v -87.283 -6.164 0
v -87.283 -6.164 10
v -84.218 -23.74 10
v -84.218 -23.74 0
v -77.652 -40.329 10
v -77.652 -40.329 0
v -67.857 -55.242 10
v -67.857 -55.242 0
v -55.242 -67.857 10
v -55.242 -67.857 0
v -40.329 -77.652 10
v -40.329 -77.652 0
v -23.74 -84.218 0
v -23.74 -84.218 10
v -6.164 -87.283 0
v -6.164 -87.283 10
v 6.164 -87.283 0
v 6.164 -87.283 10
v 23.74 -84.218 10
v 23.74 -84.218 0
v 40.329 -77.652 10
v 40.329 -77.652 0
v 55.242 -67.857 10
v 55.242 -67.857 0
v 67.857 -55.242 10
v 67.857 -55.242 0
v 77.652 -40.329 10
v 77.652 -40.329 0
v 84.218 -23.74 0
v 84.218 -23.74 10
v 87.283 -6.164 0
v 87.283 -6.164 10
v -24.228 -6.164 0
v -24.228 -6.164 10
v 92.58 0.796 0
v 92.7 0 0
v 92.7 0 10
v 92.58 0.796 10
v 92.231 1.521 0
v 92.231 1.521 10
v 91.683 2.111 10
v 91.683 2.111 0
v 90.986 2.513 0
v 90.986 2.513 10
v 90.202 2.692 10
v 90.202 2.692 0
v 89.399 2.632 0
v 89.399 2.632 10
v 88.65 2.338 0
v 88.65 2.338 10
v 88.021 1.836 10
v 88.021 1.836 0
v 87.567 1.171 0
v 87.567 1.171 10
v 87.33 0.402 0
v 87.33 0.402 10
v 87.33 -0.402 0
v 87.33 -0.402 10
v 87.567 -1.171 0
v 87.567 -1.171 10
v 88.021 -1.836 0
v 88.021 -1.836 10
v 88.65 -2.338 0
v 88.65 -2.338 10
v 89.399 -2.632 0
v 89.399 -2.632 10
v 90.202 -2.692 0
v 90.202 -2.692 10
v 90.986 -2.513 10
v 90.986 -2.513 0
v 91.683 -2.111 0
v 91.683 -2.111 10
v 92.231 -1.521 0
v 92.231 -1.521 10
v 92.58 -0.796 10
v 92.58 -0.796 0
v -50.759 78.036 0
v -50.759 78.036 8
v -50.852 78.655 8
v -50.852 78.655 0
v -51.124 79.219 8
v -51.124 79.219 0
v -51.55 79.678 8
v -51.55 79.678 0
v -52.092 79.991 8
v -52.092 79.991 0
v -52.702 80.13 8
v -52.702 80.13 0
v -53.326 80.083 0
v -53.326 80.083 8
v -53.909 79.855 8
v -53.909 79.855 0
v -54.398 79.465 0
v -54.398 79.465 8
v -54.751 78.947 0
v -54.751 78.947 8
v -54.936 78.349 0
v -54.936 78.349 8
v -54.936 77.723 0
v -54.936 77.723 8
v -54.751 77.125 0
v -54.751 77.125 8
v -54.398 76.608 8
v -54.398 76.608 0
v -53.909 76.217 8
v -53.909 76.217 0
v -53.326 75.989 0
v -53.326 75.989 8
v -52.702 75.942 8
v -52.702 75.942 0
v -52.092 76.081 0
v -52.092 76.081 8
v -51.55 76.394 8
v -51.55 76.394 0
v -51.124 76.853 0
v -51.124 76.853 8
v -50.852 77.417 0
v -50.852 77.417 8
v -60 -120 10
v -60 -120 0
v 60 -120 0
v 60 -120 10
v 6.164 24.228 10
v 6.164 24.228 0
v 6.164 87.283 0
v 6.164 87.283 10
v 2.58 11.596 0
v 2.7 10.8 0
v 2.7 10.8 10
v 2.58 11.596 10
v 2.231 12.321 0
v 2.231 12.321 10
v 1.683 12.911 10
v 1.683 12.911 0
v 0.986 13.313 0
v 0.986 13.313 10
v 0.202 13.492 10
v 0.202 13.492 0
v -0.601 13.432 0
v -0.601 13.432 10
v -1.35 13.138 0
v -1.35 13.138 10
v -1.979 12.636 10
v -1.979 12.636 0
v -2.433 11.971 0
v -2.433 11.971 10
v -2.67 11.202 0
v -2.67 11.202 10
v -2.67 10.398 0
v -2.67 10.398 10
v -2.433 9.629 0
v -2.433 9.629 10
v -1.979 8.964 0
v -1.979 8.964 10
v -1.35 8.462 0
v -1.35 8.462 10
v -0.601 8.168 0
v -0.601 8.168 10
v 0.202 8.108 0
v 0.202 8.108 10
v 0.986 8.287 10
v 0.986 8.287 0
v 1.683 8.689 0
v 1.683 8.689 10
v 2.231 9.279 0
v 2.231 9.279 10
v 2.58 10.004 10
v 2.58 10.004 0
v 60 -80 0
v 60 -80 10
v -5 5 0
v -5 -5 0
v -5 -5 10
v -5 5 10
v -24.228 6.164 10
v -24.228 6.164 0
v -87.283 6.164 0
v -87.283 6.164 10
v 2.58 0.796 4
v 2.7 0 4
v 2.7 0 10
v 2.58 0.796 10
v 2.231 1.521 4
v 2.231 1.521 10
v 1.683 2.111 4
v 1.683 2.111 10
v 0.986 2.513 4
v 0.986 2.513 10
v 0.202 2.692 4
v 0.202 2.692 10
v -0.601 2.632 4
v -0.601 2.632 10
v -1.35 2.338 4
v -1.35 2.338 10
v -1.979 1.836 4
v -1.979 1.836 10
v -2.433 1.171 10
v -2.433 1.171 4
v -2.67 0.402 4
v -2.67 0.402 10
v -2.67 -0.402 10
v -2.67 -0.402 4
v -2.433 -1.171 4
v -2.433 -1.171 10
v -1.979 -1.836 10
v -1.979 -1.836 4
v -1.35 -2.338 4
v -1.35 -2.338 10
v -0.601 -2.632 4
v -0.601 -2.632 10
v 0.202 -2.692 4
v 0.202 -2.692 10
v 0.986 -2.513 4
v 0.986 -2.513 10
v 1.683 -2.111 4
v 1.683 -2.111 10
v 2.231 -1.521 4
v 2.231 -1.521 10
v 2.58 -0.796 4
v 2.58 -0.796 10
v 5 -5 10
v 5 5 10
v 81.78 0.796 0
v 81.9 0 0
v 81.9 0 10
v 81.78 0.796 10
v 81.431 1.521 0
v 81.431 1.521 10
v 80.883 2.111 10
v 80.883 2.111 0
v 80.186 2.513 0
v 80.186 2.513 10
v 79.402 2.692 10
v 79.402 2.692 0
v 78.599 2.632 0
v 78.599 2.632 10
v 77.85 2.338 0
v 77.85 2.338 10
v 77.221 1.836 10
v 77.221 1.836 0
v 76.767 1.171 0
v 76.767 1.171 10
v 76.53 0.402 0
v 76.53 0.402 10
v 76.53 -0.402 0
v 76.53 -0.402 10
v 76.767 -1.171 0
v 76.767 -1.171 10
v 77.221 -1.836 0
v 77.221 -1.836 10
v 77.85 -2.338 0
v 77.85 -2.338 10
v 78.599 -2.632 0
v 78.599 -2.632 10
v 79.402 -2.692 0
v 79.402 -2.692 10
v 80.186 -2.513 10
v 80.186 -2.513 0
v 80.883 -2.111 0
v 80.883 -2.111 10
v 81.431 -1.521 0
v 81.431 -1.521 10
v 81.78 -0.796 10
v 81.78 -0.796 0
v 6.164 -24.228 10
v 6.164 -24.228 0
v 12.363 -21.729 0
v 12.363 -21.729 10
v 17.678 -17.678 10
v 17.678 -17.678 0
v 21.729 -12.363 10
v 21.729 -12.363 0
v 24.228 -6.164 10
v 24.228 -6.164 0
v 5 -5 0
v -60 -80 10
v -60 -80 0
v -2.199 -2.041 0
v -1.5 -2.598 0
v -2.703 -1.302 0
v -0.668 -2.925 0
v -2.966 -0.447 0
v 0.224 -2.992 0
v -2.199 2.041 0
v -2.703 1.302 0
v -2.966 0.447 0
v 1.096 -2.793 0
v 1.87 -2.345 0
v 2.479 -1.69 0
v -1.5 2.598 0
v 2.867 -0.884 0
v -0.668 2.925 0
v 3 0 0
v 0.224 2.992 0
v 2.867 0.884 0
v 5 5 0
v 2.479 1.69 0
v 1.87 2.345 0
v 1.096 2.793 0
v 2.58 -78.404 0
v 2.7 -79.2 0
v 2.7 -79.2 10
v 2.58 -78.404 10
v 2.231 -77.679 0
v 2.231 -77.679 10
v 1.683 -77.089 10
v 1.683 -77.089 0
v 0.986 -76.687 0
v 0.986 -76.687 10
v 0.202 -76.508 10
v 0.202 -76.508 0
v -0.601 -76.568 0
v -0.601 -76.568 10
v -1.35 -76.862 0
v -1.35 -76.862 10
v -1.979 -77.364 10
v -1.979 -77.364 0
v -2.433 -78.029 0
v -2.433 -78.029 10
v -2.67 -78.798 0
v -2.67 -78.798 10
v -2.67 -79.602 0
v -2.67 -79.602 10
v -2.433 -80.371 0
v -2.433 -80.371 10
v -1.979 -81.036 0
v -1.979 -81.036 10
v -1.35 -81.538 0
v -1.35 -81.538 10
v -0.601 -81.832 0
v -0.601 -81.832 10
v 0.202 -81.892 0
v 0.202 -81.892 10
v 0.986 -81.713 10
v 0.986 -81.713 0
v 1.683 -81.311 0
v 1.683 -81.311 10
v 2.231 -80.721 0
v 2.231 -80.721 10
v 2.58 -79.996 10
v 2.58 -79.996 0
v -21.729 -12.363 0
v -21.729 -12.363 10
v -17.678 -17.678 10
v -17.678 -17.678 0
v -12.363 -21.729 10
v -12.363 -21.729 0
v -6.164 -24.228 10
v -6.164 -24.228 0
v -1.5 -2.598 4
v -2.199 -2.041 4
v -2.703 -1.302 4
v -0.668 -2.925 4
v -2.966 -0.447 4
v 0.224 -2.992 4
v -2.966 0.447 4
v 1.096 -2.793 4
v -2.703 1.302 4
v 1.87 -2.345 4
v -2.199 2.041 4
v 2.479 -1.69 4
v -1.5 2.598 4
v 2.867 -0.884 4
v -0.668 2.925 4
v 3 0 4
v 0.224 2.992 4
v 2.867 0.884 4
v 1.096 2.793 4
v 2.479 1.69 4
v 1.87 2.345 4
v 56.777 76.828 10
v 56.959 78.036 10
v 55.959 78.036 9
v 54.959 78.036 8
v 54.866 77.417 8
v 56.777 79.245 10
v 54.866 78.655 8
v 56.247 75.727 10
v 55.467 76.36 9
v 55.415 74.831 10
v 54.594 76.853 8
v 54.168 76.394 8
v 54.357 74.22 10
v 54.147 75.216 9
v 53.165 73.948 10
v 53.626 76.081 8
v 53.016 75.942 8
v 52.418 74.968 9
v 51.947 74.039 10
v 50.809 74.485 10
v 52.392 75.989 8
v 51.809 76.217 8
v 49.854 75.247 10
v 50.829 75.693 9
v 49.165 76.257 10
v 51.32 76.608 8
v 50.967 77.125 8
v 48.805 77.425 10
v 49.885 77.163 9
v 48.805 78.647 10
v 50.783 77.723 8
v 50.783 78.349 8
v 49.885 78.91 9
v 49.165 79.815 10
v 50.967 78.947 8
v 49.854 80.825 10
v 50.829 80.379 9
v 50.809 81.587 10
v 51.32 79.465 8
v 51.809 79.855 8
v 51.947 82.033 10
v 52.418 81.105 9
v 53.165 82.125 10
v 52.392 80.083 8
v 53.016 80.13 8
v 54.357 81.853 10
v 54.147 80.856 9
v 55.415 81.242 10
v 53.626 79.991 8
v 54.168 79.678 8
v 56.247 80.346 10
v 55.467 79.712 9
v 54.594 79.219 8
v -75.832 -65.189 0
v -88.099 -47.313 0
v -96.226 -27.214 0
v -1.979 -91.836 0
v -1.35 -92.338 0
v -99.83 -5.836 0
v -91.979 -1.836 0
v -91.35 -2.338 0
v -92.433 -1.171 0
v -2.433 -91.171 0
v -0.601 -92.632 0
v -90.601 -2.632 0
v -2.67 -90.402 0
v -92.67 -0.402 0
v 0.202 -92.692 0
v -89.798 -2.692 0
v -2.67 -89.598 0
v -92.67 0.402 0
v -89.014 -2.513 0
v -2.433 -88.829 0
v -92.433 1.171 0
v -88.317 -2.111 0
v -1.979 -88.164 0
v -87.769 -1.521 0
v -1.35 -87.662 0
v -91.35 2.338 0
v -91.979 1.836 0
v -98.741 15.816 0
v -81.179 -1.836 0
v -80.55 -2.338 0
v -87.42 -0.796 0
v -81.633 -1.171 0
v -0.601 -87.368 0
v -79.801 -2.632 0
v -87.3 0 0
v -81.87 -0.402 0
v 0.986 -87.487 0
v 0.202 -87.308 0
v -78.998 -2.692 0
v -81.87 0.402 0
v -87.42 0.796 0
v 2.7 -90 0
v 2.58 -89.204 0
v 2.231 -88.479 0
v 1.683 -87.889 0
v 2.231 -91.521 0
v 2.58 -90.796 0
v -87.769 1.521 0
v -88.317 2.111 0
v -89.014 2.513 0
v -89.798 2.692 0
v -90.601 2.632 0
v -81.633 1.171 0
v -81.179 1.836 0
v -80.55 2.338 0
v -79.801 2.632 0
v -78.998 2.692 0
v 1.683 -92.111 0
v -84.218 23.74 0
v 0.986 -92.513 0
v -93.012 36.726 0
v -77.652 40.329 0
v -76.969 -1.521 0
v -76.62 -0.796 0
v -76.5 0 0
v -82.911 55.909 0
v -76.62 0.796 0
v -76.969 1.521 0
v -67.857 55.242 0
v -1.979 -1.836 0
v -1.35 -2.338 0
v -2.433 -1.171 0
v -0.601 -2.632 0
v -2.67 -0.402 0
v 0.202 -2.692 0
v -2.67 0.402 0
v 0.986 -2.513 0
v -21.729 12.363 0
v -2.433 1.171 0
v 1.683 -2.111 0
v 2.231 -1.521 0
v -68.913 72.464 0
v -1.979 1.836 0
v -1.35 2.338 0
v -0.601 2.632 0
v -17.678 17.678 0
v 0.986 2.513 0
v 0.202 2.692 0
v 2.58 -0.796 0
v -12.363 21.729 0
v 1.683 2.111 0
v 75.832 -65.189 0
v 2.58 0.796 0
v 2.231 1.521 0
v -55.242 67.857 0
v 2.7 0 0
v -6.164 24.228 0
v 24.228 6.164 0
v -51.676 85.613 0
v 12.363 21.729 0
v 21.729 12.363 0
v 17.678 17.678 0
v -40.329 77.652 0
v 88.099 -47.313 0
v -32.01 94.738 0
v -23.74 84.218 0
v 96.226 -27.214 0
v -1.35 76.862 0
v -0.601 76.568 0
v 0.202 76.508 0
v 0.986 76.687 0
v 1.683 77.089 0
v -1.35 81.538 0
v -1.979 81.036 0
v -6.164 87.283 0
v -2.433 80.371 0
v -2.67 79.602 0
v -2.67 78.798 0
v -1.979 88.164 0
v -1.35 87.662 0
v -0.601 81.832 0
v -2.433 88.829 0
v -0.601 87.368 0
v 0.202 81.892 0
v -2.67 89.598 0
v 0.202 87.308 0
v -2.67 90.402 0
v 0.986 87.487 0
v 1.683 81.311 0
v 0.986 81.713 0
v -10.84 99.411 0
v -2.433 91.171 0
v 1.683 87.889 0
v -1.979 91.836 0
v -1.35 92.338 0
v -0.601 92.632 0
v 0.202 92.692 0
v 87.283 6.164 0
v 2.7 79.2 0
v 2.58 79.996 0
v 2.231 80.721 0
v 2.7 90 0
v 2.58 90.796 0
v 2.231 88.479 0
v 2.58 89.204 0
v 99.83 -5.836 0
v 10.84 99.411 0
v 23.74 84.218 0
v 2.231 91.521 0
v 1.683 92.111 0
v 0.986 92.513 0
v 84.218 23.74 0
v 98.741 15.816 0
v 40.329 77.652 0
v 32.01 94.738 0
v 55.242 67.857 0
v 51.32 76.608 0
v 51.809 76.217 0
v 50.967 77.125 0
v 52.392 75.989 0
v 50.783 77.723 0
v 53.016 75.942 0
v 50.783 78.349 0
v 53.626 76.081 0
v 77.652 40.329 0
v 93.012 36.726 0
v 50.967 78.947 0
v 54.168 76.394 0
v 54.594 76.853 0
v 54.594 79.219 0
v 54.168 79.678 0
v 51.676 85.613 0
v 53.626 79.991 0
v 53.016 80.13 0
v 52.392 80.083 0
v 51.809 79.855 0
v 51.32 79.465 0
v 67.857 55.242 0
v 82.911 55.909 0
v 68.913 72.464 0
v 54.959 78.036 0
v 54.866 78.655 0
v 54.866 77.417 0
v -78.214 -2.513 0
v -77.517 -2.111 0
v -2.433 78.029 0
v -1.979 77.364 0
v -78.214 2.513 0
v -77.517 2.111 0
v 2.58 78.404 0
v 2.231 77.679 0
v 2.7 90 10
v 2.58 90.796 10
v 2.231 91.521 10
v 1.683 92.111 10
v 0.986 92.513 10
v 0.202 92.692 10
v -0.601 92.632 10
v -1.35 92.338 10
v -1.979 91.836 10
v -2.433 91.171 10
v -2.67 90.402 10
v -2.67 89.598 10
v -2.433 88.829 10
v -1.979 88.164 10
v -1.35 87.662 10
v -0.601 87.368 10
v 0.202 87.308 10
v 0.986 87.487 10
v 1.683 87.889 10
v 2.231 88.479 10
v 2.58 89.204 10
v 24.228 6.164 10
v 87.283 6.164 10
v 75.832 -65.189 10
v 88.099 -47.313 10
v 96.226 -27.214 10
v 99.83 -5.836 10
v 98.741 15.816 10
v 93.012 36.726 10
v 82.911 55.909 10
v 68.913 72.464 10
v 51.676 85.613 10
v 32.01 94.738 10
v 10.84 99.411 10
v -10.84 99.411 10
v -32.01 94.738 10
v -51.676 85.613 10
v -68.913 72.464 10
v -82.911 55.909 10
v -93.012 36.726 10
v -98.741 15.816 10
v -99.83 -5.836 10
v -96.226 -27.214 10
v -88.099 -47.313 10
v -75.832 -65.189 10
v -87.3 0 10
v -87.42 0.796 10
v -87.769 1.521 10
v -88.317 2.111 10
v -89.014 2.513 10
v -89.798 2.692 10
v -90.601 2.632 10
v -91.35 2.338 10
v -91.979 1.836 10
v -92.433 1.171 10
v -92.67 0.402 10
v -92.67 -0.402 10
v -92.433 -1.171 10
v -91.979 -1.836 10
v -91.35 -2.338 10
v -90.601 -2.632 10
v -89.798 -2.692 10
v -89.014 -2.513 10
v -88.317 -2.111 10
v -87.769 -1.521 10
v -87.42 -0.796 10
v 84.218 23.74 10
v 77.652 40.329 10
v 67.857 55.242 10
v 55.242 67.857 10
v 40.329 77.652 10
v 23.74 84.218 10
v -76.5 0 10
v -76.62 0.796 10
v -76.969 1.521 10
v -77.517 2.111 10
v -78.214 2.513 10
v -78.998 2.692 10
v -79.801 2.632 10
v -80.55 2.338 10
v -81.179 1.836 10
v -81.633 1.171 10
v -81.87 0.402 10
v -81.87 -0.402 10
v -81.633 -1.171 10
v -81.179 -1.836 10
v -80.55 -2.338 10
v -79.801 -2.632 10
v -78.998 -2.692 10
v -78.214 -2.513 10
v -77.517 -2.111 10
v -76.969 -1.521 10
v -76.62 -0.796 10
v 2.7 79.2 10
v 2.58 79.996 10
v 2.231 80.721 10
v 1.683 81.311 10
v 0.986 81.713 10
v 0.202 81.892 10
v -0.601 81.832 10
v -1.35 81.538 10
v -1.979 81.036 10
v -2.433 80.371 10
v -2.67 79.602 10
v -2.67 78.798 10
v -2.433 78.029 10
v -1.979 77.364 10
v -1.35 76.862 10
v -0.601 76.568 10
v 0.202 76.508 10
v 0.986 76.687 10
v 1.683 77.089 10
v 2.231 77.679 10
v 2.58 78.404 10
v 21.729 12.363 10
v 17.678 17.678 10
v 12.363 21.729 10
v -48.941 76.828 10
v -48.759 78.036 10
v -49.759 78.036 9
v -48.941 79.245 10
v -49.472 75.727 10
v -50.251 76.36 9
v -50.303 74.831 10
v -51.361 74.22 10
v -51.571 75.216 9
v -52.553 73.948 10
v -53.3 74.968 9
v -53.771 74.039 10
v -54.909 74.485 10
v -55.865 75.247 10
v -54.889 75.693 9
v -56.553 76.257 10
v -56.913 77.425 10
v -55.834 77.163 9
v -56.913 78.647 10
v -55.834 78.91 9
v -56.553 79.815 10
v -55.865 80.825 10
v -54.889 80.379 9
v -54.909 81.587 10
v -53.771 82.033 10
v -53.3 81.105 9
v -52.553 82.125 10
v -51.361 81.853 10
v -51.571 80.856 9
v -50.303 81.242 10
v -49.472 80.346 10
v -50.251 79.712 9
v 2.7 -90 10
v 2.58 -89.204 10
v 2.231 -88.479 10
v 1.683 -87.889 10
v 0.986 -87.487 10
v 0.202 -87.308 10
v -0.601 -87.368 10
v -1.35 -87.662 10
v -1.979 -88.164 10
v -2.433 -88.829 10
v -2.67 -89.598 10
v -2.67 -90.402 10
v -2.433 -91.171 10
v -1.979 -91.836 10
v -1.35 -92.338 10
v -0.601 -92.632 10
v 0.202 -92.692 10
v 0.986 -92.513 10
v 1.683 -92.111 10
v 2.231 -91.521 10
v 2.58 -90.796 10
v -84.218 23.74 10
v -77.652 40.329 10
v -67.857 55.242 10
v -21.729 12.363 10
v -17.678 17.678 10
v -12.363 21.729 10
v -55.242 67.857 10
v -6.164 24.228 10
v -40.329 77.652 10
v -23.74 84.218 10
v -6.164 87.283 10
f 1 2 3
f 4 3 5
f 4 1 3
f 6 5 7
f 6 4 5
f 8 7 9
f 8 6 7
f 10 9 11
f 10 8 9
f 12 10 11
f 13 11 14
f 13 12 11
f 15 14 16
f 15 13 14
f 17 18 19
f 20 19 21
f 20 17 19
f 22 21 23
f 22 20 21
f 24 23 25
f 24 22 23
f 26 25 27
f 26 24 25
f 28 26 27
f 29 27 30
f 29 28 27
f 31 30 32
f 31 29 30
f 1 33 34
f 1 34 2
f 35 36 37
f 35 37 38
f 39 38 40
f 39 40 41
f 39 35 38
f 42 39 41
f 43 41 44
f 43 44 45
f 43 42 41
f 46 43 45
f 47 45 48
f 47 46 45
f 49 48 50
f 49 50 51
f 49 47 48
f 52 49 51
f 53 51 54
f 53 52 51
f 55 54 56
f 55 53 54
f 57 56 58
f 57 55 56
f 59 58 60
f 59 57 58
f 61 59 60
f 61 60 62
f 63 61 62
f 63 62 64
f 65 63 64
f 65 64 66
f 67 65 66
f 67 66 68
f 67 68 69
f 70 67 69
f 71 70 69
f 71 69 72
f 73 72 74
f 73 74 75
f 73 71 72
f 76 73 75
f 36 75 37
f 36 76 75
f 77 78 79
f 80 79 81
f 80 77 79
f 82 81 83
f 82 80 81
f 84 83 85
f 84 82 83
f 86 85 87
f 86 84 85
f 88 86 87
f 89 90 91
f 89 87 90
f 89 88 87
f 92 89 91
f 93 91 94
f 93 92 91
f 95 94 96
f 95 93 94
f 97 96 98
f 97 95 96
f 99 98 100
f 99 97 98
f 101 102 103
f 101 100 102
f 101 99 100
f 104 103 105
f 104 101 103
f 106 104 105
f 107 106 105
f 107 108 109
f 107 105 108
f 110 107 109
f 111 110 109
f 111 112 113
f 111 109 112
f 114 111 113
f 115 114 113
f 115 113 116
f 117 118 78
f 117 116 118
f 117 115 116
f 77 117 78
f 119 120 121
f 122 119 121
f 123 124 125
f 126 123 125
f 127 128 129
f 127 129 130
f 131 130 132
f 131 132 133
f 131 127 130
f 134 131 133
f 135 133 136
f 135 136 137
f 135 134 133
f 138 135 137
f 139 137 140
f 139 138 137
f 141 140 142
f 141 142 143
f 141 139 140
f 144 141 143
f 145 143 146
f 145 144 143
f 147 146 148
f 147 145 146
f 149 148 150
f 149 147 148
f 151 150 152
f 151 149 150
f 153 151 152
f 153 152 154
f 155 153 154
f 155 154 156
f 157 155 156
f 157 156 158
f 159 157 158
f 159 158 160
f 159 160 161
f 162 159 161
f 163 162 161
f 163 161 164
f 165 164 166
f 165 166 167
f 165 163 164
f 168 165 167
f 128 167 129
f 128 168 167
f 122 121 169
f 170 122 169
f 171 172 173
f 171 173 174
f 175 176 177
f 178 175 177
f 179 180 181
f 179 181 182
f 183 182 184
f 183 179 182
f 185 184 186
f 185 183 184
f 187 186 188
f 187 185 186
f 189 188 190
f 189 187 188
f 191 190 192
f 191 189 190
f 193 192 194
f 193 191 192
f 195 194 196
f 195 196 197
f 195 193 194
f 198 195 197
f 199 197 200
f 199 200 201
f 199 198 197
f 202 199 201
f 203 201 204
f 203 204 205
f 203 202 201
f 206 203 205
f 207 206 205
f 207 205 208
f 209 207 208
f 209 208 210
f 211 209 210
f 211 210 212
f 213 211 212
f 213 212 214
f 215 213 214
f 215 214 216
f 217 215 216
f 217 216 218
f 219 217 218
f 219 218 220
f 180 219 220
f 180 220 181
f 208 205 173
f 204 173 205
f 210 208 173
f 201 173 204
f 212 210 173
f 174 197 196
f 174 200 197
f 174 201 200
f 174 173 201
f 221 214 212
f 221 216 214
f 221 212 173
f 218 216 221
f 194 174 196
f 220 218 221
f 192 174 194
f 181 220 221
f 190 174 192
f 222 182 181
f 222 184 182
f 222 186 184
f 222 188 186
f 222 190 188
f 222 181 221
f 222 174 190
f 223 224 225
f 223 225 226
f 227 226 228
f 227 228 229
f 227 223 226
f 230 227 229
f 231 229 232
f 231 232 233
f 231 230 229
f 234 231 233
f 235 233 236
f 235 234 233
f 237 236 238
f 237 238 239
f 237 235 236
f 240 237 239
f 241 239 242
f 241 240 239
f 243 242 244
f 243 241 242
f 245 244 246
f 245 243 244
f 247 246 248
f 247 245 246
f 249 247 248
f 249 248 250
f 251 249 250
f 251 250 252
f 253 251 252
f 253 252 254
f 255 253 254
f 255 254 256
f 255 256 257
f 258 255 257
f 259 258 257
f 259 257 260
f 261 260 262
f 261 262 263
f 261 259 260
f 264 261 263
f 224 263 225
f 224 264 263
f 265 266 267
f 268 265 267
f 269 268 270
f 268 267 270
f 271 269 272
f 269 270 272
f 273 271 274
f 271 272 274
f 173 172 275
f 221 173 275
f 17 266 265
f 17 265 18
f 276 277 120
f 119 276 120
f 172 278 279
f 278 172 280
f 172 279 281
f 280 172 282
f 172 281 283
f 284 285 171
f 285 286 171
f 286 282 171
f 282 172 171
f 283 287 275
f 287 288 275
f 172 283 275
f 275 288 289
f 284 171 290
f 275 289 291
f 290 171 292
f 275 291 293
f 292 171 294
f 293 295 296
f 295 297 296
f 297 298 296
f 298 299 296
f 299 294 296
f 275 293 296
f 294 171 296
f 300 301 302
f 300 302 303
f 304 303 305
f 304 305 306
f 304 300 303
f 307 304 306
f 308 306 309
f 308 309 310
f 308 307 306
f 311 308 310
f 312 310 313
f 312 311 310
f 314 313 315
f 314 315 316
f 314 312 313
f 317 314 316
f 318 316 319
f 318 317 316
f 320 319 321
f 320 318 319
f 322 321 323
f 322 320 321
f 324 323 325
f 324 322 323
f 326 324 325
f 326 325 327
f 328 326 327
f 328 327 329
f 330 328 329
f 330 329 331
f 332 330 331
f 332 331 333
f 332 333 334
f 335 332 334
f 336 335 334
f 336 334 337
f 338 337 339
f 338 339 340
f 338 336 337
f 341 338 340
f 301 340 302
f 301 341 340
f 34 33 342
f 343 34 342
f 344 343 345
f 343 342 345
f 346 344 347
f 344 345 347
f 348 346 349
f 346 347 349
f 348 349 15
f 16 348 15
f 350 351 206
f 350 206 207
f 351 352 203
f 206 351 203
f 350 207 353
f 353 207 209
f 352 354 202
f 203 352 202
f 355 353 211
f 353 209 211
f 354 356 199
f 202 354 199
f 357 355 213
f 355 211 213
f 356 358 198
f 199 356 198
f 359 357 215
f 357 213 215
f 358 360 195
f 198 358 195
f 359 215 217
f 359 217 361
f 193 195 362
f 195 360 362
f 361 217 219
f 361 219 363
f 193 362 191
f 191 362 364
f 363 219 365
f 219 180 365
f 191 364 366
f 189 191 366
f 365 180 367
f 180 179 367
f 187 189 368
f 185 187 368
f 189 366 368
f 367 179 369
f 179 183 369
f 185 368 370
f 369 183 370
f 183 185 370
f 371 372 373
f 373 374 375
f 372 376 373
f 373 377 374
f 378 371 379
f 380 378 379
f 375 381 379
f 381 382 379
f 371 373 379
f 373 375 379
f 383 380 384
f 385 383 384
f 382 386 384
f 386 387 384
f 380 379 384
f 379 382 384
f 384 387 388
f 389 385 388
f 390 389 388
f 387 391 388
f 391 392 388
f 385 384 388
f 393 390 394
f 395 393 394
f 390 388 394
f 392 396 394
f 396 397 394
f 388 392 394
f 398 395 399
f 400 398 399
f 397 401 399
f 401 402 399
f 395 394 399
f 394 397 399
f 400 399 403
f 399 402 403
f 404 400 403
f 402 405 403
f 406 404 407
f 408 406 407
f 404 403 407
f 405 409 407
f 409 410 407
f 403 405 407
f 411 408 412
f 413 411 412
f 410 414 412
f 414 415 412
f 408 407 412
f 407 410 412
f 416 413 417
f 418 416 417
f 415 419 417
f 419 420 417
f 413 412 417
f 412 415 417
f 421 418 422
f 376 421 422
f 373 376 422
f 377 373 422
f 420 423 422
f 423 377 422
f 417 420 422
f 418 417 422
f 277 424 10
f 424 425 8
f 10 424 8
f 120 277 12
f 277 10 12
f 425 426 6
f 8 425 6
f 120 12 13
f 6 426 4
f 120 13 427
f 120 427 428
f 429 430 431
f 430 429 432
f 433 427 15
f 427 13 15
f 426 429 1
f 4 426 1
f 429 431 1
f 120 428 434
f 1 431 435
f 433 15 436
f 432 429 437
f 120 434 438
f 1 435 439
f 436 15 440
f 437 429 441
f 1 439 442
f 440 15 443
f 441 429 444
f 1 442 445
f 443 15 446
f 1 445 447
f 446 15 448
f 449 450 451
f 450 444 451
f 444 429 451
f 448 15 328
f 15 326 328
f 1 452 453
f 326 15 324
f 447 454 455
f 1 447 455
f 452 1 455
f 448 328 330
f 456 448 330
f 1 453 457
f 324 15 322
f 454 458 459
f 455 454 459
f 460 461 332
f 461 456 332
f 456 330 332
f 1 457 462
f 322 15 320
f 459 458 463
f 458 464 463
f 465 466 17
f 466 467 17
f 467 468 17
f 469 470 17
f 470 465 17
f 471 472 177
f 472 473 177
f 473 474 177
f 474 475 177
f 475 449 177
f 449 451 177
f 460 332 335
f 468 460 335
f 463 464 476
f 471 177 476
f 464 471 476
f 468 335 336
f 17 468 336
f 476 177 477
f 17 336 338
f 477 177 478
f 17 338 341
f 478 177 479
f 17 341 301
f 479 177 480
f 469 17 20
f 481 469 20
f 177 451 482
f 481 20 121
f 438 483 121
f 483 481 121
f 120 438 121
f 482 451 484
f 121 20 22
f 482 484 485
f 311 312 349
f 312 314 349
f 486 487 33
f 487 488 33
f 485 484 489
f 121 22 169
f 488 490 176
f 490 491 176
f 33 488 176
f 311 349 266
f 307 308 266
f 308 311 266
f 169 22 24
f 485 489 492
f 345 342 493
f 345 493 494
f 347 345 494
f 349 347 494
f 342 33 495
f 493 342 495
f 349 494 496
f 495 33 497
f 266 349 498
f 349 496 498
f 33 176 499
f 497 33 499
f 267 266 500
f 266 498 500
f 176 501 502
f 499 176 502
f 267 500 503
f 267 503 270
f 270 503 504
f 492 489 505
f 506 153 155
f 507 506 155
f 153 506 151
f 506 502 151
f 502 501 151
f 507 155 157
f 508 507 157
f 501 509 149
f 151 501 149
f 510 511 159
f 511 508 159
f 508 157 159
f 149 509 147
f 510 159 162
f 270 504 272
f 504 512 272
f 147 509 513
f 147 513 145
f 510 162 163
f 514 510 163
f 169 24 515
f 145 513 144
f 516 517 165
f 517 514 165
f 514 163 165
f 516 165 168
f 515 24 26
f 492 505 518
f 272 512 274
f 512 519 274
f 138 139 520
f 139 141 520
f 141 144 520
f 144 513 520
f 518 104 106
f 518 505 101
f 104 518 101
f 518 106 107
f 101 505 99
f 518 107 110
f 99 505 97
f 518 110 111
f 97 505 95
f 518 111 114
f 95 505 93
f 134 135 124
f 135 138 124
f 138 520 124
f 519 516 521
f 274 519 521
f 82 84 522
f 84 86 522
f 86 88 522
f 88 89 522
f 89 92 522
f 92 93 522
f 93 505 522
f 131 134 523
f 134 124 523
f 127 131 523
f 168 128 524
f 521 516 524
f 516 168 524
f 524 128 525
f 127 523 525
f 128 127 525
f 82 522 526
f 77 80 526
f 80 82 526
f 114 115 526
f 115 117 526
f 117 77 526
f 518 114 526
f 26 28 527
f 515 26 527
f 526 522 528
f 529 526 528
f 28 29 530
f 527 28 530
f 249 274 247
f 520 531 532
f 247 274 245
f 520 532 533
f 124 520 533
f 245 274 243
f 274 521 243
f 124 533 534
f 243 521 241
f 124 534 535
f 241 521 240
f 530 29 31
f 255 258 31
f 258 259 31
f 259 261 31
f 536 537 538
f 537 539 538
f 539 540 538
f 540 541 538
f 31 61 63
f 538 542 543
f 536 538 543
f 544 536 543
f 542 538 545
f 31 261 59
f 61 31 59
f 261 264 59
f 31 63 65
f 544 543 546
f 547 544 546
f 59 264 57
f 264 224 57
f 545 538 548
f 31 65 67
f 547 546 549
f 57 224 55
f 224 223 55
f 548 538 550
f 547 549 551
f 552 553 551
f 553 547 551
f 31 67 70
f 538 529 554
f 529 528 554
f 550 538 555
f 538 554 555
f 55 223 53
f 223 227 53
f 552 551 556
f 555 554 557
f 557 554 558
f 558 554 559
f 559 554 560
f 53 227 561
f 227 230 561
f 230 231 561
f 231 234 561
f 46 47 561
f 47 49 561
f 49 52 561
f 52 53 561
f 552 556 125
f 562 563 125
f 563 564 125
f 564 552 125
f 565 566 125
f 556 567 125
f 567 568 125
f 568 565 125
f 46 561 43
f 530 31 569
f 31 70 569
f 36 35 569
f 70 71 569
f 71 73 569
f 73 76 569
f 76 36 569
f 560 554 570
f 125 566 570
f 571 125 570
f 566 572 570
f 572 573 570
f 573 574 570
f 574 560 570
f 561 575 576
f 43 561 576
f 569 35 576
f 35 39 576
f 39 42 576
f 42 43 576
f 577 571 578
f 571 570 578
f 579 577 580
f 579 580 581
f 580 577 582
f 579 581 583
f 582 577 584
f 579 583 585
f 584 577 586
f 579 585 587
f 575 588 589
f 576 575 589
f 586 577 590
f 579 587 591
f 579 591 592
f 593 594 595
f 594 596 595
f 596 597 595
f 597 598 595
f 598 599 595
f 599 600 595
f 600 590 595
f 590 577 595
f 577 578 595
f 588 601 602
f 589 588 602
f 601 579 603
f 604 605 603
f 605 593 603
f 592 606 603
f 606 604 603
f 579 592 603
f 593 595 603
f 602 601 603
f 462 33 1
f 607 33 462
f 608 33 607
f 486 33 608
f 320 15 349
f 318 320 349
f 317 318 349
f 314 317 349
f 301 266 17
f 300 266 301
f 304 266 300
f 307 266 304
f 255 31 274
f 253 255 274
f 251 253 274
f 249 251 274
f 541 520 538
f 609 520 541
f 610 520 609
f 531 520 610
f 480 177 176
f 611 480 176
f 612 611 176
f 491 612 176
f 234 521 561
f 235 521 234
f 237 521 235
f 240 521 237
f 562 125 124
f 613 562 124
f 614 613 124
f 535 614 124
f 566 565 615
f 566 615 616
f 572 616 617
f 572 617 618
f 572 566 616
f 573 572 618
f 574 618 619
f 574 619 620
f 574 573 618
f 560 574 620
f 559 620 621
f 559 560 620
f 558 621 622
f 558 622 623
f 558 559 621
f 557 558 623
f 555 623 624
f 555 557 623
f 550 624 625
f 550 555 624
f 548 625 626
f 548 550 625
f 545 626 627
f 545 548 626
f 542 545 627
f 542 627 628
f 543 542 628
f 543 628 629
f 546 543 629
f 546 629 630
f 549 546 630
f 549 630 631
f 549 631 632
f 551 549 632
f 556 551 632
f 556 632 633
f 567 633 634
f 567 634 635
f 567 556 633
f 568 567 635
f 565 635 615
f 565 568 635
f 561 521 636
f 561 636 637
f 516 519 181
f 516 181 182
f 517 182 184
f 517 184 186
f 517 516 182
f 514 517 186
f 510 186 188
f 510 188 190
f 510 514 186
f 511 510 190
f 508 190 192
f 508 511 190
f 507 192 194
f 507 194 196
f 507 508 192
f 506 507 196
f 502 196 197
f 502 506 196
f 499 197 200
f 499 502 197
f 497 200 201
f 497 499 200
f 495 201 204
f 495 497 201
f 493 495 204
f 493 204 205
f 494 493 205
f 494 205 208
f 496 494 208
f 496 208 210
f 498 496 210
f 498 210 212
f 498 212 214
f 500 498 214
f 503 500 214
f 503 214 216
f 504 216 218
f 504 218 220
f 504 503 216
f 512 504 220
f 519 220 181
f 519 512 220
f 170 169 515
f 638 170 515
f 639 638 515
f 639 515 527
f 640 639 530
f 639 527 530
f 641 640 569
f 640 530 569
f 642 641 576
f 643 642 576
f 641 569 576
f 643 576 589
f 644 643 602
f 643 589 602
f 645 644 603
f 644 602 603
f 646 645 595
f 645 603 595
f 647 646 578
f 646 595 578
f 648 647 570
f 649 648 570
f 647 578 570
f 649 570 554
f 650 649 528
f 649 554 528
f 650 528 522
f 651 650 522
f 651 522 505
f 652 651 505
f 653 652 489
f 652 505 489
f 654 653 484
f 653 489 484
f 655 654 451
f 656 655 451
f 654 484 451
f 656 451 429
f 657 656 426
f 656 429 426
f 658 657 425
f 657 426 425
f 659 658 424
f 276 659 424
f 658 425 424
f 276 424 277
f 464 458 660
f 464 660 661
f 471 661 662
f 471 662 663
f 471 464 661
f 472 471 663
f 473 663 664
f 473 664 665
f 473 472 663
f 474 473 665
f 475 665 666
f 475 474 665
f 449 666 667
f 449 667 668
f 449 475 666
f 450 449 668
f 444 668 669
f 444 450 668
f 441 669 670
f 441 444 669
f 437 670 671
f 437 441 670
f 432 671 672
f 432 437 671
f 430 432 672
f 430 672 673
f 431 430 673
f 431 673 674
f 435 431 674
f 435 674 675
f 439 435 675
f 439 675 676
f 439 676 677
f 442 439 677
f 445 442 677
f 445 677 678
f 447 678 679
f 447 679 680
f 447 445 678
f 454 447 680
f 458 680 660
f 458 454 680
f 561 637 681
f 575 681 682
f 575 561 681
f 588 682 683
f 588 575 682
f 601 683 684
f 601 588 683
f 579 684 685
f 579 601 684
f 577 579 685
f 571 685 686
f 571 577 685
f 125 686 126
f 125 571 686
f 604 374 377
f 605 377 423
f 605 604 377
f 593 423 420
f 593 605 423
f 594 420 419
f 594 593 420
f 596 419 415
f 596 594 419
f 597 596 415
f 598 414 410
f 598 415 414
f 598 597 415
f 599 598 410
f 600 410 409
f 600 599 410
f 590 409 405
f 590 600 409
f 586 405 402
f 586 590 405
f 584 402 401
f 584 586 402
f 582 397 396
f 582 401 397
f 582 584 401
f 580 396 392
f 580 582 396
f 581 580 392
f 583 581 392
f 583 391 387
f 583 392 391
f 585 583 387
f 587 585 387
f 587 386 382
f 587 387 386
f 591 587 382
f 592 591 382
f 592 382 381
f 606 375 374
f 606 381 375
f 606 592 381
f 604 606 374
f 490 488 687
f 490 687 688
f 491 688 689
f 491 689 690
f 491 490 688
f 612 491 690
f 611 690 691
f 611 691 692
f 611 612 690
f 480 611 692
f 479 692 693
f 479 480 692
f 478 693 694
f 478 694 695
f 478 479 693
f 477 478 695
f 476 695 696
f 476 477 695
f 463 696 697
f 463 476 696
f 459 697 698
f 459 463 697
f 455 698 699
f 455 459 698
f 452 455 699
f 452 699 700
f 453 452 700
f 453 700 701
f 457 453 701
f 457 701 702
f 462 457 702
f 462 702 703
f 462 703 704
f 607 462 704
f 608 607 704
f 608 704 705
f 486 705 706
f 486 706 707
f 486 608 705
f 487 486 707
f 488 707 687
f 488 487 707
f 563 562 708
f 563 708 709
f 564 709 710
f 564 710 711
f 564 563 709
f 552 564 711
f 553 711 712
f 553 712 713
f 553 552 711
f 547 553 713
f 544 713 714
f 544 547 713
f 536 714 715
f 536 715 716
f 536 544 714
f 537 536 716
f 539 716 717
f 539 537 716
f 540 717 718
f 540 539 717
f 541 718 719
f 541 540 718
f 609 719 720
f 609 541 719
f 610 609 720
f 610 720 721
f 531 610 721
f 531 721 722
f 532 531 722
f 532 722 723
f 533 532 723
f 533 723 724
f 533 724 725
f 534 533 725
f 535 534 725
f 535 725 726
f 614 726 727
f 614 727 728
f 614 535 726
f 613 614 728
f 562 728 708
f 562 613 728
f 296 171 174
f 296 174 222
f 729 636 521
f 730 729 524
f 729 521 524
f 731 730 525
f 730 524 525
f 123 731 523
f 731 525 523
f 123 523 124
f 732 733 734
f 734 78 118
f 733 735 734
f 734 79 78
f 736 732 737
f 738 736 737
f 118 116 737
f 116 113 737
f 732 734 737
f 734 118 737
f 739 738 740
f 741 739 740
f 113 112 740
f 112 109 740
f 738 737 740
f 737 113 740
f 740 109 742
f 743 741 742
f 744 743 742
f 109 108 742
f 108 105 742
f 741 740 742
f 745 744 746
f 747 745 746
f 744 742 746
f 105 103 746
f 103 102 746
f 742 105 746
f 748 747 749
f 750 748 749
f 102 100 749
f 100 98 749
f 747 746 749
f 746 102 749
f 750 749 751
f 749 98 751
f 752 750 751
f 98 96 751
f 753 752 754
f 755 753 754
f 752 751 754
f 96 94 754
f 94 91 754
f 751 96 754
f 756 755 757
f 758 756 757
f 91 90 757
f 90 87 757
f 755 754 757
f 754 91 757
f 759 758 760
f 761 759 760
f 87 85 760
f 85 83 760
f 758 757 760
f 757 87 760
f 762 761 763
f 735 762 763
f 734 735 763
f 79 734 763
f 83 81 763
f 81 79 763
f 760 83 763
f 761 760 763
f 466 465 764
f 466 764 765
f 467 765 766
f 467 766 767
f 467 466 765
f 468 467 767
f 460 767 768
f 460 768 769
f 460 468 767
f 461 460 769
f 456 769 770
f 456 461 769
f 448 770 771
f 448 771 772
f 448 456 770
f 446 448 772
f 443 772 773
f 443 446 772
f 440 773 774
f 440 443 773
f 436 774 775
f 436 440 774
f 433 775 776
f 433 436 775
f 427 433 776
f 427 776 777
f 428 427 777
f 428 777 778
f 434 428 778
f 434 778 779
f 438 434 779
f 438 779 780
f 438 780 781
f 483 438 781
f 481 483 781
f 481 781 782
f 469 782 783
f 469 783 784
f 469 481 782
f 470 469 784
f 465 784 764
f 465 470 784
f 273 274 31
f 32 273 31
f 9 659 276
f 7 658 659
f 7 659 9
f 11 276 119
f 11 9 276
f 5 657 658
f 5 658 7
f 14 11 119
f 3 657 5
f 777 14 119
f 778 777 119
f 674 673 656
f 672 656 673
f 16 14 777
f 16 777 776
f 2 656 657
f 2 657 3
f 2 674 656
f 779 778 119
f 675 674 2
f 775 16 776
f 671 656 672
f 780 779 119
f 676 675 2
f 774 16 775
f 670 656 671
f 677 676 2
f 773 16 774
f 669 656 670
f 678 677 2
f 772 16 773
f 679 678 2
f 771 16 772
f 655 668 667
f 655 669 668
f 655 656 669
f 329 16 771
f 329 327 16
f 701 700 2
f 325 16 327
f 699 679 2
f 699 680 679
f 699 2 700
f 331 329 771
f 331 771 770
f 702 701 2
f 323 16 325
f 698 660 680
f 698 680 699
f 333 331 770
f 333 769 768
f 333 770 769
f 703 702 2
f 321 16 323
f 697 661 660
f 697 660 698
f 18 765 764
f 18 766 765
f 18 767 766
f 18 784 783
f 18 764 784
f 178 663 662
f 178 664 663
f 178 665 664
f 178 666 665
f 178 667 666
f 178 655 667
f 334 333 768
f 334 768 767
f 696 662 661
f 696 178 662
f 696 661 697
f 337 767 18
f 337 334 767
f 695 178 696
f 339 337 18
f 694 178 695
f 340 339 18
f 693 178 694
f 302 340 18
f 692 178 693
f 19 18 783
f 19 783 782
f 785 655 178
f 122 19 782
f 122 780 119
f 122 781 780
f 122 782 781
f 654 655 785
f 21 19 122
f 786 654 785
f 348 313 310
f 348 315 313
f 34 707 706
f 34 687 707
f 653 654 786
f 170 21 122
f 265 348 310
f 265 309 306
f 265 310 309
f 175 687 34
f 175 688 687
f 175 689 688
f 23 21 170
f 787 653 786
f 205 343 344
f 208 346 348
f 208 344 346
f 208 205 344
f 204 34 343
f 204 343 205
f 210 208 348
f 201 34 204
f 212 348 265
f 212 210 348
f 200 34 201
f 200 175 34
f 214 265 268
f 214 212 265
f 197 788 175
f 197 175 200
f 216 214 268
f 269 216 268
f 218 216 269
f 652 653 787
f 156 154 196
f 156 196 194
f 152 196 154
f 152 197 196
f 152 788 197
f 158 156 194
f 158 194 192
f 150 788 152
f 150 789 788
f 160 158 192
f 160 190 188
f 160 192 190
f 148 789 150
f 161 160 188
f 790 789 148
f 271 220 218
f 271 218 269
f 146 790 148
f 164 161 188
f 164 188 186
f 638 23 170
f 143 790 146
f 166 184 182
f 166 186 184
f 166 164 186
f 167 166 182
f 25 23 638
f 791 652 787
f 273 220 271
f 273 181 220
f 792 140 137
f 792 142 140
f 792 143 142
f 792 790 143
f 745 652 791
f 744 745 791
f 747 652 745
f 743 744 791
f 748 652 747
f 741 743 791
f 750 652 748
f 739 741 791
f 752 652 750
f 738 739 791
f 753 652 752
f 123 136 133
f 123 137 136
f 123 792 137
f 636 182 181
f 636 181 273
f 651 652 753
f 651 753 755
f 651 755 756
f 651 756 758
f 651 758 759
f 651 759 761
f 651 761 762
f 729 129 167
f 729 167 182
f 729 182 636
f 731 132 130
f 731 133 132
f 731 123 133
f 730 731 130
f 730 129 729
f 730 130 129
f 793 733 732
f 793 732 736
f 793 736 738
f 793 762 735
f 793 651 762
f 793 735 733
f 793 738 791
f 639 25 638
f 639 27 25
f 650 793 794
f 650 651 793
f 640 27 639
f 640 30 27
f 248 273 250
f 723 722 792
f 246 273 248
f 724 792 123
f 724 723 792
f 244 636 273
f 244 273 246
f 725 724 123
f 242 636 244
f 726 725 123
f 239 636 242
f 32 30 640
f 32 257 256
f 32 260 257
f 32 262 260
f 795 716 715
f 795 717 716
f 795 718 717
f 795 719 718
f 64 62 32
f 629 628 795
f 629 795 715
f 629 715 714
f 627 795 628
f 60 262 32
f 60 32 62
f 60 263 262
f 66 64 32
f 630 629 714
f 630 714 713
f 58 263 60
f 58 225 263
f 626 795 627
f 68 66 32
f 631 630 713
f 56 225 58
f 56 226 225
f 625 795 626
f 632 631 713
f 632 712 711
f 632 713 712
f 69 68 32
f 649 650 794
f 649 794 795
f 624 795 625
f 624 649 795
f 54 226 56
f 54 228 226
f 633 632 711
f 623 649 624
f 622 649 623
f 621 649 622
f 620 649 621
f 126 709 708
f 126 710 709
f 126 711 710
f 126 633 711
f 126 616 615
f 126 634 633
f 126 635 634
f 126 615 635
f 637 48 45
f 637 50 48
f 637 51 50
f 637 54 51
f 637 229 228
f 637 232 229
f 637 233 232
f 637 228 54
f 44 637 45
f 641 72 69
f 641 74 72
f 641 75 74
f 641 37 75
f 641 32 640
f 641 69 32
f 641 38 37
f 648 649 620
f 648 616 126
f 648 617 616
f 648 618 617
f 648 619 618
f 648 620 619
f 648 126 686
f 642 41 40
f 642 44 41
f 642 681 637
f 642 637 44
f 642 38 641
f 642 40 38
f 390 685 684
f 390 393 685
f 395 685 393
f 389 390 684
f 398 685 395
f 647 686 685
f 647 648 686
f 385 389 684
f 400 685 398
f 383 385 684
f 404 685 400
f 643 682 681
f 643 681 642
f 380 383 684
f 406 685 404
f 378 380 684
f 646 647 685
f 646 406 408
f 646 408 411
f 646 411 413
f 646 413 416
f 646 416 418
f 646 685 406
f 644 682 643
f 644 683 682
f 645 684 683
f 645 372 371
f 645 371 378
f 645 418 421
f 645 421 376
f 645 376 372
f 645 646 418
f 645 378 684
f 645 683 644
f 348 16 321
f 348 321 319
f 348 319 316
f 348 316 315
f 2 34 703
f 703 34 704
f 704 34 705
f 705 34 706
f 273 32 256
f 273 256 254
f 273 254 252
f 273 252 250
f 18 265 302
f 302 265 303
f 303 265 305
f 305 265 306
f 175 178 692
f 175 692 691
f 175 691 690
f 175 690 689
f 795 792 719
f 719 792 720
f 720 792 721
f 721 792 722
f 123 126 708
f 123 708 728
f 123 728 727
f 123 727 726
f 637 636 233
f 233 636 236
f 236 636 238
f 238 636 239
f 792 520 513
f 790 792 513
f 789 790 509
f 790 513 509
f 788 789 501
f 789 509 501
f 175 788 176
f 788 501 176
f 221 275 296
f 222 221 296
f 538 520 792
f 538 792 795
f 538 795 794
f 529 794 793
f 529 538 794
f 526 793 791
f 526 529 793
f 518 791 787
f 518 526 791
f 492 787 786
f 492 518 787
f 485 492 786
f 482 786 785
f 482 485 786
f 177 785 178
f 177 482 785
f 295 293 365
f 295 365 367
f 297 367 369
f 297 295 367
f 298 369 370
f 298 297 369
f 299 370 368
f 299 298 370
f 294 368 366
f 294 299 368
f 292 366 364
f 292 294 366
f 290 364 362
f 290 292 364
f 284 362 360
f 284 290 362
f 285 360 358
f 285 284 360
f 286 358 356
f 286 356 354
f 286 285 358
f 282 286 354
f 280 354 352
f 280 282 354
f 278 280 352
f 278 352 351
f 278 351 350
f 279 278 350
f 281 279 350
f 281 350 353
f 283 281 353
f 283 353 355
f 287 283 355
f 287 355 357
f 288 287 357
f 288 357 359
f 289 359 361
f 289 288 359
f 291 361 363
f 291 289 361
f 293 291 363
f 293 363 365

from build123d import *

# Parameters (mm, degrees)
SKETCH_W           = 10
SKETCH_H           = 10
SKETCH_R           = 2.7
PAD_DEPTH          = 10
SKETCH001_R        = 3
POCKET_DEPTH       = 4
SKETCH002_R        = 2.7
PAD001_DEPTH       = 10
POCKET001_DEPTH    = 604.979991
POLARPATTERN_COUNT = 4
SKETCH004_R        = 2.1
POCKET002_DEPTH    = 10.001
CHAMFER_SIZE       = 2


with BuildPart() as led_proto:
    # Sketch → Pad (new body)
    with BuildSketch(Plane.XY):
        Rectangle(SKETCH_W, SKETCH_H)
        Circle(SKETCH_R, mode=Mode.SUBTRACT)
    extrude(amount=PAD_DEPTH)

    # Sketch001 → Pocket (cut)
    with BuildSketch(Plane.XY):
        Circle(SKETCH001_R)
    extrude(amount=POCKET_DEPTH, mode=Mode.SUBTRACT)


with BuildPart() as target:
    # Sketch002 → Pad001 (new body)
    with BuildSketch(Plane.XY):
        with BuildLine():
            Line((-60, -80), (-60, -120))
            Line((-60, -120), (60, -120))
            Line((60, -120), (60, -80))
            ThreePointArc((60, -80), (0, 100), (-60, -80))
        make_face()
        with Locations((-90, 0)):
            Circle(SKETCH002_R, mode=Mode.SUBTRACT)
        with Locations((-79.2, 0)):
            Circle(SKETCH002_R, mode=Mode.SUBTRACT)
        with Locations((0, -90)):
            Circle(SKETCH002_R, mode=Mode.SUBTRACT)
        with Locations((0, -79.2)):
            Circle(SKETCH002_R, mode=Mode.SUBTRACT)
        with Locations((79.2, 0)):
            Circle(SKETCH002_R, mode=Mode.SUBTRACT)
        with Locations((90, 0)):
            Circle(SKETCH002_R, mode=Mode.SUBTRACT)
        with Locations((0, 90)):
            Circle(SKETCH002_R, mode=Mode.SUBTRACT)
        with Locations((0, 79.2)):
            Circle(SKETCH002_R, mode=Mode.SUBTRACT)
        Circle(SKETCH002_R, mode=Mode.SUBTRACT)
        with Locations((0, 10.8)):
            Circle(SKETCH002_R, mode=Mode.SUBTRACT)
    extrude(amount=PAD001_DEPTH)

    # Sketch003 → Pocket001 (cut, through all)
    with BuildSketch(Plane.XY):
        with BuildLine():
            ThreePointArc((24.228072, 6.164459), (17.67767, 17.67767), (6.164459, 24.228072))
            Line((6.164459, 24.228072), (6.164459, 87.282584))
            ThreePointArc((87.282584, 6.164459), (61.871843, 61.871843), (6.164459, 87.282584))
            Line((24.228072, 6.164459), (87.282584, 6.164459))
        make_face()
    pocket001 = extrude(amount=POCKET001_DEPTH, mode=Mode.SUBTRACT)

    # PolarPattern: Pocket001 ×4 about axis
    polarpattern_axis = Axis((0, 0, 0), (0, 0, 1))
    for i in range(1, POLARPATTERN_COUNT):
        add(pocket001.rotate(polarpattern_axis, i * 360 / POLARPATTERN_COUNT), mode=Mode.SUBTRACT)

    # Sketch004 → Pocket002 (cut, through all)
    with BuildSketch(Plane.XY):
        with Locations((52.859089, 78.036148)):
            Circle(SKETCH004_R)
        with Locations((-52.859089, 78.036148)):
            Circle(SKETCH004_R)
    extrude(amount=POCKET002_DEPTH, mode=Mode.SUBTRACT)

    # Chamfer
    chamfer_edges = [target.edges().sort_by_distance(p)[0] for p in [
        (50.759089, 78.036148, 10),
        (-54.959089, 78.036148, 10),
    ]]
    chamfer(chamfer_edges, length=CHAMFER_SIZE)


solid = Compound([led_proto.part, target.part])
